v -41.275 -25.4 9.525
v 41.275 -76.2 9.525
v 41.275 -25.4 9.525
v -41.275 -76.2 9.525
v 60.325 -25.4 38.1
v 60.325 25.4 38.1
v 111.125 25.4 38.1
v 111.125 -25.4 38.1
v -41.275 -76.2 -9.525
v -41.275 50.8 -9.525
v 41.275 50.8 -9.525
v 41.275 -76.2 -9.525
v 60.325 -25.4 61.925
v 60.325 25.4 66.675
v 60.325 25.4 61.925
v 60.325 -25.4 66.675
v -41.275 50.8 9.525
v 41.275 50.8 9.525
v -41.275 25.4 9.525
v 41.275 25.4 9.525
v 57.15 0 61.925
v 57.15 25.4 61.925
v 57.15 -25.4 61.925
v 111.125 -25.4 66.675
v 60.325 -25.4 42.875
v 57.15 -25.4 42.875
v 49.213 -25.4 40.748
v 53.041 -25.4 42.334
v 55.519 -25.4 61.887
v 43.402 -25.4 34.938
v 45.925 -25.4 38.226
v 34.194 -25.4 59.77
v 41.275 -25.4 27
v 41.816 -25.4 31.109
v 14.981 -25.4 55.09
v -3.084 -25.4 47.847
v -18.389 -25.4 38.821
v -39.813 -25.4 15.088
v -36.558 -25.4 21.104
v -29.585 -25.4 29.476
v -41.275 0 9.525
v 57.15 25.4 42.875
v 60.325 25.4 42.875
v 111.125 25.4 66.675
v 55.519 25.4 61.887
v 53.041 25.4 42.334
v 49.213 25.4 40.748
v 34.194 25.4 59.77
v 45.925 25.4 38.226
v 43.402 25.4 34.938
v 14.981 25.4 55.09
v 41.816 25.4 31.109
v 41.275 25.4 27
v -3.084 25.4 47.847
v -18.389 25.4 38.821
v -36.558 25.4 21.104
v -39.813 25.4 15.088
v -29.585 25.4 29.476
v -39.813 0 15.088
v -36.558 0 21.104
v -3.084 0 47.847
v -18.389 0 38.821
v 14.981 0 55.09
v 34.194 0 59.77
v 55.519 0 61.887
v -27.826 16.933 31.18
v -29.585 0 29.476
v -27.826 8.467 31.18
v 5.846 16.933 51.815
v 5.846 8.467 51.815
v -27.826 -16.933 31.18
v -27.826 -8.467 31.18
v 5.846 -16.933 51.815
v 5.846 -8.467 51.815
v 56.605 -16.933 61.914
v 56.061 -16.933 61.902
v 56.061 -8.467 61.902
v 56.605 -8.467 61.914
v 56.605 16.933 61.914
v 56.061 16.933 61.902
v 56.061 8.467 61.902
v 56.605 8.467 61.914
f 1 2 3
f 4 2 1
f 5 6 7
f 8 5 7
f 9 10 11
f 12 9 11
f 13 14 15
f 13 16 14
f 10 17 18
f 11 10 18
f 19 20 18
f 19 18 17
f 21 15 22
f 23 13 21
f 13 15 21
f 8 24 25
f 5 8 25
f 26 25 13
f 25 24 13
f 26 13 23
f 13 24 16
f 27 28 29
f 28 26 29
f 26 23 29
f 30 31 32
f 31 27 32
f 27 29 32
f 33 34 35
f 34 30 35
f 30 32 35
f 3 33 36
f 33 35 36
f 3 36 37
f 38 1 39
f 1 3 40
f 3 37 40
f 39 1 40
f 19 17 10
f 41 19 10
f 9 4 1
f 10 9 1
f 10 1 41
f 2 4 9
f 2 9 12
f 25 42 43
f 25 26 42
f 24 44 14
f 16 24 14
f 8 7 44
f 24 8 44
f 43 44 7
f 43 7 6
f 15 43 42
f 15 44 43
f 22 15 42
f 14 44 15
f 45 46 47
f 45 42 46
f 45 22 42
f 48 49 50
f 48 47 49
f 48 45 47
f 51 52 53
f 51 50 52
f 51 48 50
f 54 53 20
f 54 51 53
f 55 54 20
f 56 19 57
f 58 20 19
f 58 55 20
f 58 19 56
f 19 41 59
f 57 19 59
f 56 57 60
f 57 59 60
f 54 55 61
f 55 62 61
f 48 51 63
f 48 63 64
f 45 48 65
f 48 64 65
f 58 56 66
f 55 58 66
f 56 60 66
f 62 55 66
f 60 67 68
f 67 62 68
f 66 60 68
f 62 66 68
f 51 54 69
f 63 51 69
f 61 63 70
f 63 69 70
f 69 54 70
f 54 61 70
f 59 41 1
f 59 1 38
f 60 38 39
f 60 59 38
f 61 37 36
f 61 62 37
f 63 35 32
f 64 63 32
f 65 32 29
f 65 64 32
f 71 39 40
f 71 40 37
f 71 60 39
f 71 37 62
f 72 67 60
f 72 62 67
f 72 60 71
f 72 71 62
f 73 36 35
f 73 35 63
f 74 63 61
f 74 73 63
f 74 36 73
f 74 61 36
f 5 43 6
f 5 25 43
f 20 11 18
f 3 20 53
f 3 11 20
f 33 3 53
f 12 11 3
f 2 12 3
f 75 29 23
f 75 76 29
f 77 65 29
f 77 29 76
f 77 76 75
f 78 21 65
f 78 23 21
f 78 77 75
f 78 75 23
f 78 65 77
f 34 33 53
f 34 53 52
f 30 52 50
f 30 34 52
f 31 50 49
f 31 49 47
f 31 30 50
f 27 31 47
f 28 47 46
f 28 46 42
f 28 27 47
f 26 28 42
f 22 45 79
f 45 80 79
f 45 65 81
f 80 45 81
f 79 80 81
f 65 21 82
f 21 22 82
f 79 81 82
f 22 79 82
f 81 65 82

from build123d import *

# Parameters (mm, degrees)
F0_W     = 25.4
F0_H     = 19.05
F1_DEPTH = 25.4
F2_DEPTH = 12.7
F3_DEPTH = 63.5


# Not quite as in the source:
# - a feature of the source that left no trace in its solid (it failed there, or was rolled back) is left out


with BuildPart() as f1:
    # F0 (on Front) → F1 (new body, symmetric)
    with BuildSketch(Plane.XZ):
        with BuildLine():
            add(Edge.make_bspline(
                [(-41.275, 9.525), (-39.3446406739, 28.5086459931), (-0.7471661584, 60.2765032574), (55.5187541124, 61.8870838083)],
                knots=[0, 0, 0, 0, 110.4404580892, 110.4404580892, 110.4404580892, 110.4404580892], degree=3))
            Line((-41.275, 9.525), (22.225, 9.525))
            Line((22.225, 9.525), (22.225, 27.0002))
            ThreePointArc((22.225, 27.0002), (31.8841447045, 51.1122754227), (55.5187541124, 61.8870838083))
        make_face()
        with BuildLine():
            Line((22.225, 9.525), (41.275, 9.525))
            Line((41.275, 9.525), (41.275, 27.0002))
            ThreePointArc((41.275, 27.0002), (45.9246798487, 38.2255201513), (57.15, 42.8752))
            Line((57.15, 42.8752), (60.325, 42.8752))
            Line((60.325, 42.8752), (60.325, 61.9252))
            Line((60.325, 61.9252), (57.15, 61.9252))
            add(Edge.make_bspline(
                [(55.5187541124, 61.8870838083), (56.0608682355, 61.9026015224), (56.6046225289, 61.915319722), (57.15, 61.9252)],
                knots=[110.4404580892, 110.4404580892, 110.4404580892, 110.4404580892, 111.5045361635, 111.5045361635, 111.5045361635, 111.5045361635], degree=3))
            ThreePointArc((55.5187541124, 61.8870838083), (31.8841447045, 51.1122754227), (22.225, 27.0002))
            Line((22.225, 27.0002), (22.225, 9.525))
        make_face()
        with Locations((73.025, 52.4002)):
            Rectangle(F0_W, F0_H)
        Polygon((60.325, 66.675), (60.325, 61.9252), (85.725, 61.9252), (85.725, 42.8752), (60.325, 42.8752), (60.325, 38.1), (111.125, 38.1), (111.125, 66.675), align=None)
    extrude(amount=F1_DEPTH, both=True)

    # F0 (on Front) → F2 (join, symmetric)
    with BuildSketch(Plane.XZ):
        Polygon((-41.275, 9.525), (-41.275, -9.525), (41.275, -9.525), (41.275, 9.525), (22.225, 9.525), align=None)
        with BuildLine():
            add(Edge.make_bspline(
                [(-41.275, 9.525), (-39.3446406739, 28.5086459931), (-0.7471661584, 60.2765032574), (55.5187541124, 61.8870838083)],
                knots=[0, 0, 0, 0, 110.4404580892, 110.4404580892, 110.4404580892, 110.4404580892], degree=3))
            Line((-41.275, 9.525), (22.225, 9.525))
            Line((22.225, 9.525), (22.225, 27.0002))
            ThreePointArc((22.225, 27.0002), (31.8841447045, 51.1122754227), (55.5187541124, 61.8870838083))
        make_face()
        with BuildLine():
            Line((22.225, 9.525), (41.275, 9.525))
            Line((41.275, 9.525), (41.275, 27.0002))
            ThreePointArc((41.275, 27.0002), (45.9246798487, 38.2255201513), (57.15, 42.8752))
            Line((57.15, 42.8752), (60.325, 42.8752))
            Line((60.325, 42.8752), (60.325, 61.9252))
            Line((60.325, 61.9252), (57.15, 61.9252))
            add(Edge.make_bspline(
                [(55.5187541124, 61.8870838083), (56.0608682355, 61.9026015224), (56.6046225289, 61.915319722), (57.15, 61.9252)],
                knots=[110.4404580892, 110.4404580892, 110.4404580892, 110.4404580892, 111.5045361635, 111.5045361635, 111.5045361635, 111.5045361635], degree=3))
            ThreePointArc((55.5187541124, 61.8870838083), (31.8841447045, 51.1122754227), (22.225, 27.0002))
            Line((22.225, 27.0002), (22.225, 9.525))
        make_face()
        with Locations((73.025, 52.4002)):
            Rectangle(F0_W, F0_H)
        Polygon((60.325, 66.675), (60.325, 61.9252), (85.725, 61.9252), (85.725, 42.8752), (60.325, 42.8752), (60.325, 38.1), (111.125, 38.1), (111.125, 66.675), align=None)
    extrude(amount=F2_DEPTH, both=True)

    # F3 (add, symmetric): a face of the model
    f3_faces = [f1.faces().sort_by_distance(p)[0] for p in [
        (0, -12.7, 0),
    ]]
    extrude(f3_faces, amount=F3_DEPTH, both=True)


solid = f1.part
